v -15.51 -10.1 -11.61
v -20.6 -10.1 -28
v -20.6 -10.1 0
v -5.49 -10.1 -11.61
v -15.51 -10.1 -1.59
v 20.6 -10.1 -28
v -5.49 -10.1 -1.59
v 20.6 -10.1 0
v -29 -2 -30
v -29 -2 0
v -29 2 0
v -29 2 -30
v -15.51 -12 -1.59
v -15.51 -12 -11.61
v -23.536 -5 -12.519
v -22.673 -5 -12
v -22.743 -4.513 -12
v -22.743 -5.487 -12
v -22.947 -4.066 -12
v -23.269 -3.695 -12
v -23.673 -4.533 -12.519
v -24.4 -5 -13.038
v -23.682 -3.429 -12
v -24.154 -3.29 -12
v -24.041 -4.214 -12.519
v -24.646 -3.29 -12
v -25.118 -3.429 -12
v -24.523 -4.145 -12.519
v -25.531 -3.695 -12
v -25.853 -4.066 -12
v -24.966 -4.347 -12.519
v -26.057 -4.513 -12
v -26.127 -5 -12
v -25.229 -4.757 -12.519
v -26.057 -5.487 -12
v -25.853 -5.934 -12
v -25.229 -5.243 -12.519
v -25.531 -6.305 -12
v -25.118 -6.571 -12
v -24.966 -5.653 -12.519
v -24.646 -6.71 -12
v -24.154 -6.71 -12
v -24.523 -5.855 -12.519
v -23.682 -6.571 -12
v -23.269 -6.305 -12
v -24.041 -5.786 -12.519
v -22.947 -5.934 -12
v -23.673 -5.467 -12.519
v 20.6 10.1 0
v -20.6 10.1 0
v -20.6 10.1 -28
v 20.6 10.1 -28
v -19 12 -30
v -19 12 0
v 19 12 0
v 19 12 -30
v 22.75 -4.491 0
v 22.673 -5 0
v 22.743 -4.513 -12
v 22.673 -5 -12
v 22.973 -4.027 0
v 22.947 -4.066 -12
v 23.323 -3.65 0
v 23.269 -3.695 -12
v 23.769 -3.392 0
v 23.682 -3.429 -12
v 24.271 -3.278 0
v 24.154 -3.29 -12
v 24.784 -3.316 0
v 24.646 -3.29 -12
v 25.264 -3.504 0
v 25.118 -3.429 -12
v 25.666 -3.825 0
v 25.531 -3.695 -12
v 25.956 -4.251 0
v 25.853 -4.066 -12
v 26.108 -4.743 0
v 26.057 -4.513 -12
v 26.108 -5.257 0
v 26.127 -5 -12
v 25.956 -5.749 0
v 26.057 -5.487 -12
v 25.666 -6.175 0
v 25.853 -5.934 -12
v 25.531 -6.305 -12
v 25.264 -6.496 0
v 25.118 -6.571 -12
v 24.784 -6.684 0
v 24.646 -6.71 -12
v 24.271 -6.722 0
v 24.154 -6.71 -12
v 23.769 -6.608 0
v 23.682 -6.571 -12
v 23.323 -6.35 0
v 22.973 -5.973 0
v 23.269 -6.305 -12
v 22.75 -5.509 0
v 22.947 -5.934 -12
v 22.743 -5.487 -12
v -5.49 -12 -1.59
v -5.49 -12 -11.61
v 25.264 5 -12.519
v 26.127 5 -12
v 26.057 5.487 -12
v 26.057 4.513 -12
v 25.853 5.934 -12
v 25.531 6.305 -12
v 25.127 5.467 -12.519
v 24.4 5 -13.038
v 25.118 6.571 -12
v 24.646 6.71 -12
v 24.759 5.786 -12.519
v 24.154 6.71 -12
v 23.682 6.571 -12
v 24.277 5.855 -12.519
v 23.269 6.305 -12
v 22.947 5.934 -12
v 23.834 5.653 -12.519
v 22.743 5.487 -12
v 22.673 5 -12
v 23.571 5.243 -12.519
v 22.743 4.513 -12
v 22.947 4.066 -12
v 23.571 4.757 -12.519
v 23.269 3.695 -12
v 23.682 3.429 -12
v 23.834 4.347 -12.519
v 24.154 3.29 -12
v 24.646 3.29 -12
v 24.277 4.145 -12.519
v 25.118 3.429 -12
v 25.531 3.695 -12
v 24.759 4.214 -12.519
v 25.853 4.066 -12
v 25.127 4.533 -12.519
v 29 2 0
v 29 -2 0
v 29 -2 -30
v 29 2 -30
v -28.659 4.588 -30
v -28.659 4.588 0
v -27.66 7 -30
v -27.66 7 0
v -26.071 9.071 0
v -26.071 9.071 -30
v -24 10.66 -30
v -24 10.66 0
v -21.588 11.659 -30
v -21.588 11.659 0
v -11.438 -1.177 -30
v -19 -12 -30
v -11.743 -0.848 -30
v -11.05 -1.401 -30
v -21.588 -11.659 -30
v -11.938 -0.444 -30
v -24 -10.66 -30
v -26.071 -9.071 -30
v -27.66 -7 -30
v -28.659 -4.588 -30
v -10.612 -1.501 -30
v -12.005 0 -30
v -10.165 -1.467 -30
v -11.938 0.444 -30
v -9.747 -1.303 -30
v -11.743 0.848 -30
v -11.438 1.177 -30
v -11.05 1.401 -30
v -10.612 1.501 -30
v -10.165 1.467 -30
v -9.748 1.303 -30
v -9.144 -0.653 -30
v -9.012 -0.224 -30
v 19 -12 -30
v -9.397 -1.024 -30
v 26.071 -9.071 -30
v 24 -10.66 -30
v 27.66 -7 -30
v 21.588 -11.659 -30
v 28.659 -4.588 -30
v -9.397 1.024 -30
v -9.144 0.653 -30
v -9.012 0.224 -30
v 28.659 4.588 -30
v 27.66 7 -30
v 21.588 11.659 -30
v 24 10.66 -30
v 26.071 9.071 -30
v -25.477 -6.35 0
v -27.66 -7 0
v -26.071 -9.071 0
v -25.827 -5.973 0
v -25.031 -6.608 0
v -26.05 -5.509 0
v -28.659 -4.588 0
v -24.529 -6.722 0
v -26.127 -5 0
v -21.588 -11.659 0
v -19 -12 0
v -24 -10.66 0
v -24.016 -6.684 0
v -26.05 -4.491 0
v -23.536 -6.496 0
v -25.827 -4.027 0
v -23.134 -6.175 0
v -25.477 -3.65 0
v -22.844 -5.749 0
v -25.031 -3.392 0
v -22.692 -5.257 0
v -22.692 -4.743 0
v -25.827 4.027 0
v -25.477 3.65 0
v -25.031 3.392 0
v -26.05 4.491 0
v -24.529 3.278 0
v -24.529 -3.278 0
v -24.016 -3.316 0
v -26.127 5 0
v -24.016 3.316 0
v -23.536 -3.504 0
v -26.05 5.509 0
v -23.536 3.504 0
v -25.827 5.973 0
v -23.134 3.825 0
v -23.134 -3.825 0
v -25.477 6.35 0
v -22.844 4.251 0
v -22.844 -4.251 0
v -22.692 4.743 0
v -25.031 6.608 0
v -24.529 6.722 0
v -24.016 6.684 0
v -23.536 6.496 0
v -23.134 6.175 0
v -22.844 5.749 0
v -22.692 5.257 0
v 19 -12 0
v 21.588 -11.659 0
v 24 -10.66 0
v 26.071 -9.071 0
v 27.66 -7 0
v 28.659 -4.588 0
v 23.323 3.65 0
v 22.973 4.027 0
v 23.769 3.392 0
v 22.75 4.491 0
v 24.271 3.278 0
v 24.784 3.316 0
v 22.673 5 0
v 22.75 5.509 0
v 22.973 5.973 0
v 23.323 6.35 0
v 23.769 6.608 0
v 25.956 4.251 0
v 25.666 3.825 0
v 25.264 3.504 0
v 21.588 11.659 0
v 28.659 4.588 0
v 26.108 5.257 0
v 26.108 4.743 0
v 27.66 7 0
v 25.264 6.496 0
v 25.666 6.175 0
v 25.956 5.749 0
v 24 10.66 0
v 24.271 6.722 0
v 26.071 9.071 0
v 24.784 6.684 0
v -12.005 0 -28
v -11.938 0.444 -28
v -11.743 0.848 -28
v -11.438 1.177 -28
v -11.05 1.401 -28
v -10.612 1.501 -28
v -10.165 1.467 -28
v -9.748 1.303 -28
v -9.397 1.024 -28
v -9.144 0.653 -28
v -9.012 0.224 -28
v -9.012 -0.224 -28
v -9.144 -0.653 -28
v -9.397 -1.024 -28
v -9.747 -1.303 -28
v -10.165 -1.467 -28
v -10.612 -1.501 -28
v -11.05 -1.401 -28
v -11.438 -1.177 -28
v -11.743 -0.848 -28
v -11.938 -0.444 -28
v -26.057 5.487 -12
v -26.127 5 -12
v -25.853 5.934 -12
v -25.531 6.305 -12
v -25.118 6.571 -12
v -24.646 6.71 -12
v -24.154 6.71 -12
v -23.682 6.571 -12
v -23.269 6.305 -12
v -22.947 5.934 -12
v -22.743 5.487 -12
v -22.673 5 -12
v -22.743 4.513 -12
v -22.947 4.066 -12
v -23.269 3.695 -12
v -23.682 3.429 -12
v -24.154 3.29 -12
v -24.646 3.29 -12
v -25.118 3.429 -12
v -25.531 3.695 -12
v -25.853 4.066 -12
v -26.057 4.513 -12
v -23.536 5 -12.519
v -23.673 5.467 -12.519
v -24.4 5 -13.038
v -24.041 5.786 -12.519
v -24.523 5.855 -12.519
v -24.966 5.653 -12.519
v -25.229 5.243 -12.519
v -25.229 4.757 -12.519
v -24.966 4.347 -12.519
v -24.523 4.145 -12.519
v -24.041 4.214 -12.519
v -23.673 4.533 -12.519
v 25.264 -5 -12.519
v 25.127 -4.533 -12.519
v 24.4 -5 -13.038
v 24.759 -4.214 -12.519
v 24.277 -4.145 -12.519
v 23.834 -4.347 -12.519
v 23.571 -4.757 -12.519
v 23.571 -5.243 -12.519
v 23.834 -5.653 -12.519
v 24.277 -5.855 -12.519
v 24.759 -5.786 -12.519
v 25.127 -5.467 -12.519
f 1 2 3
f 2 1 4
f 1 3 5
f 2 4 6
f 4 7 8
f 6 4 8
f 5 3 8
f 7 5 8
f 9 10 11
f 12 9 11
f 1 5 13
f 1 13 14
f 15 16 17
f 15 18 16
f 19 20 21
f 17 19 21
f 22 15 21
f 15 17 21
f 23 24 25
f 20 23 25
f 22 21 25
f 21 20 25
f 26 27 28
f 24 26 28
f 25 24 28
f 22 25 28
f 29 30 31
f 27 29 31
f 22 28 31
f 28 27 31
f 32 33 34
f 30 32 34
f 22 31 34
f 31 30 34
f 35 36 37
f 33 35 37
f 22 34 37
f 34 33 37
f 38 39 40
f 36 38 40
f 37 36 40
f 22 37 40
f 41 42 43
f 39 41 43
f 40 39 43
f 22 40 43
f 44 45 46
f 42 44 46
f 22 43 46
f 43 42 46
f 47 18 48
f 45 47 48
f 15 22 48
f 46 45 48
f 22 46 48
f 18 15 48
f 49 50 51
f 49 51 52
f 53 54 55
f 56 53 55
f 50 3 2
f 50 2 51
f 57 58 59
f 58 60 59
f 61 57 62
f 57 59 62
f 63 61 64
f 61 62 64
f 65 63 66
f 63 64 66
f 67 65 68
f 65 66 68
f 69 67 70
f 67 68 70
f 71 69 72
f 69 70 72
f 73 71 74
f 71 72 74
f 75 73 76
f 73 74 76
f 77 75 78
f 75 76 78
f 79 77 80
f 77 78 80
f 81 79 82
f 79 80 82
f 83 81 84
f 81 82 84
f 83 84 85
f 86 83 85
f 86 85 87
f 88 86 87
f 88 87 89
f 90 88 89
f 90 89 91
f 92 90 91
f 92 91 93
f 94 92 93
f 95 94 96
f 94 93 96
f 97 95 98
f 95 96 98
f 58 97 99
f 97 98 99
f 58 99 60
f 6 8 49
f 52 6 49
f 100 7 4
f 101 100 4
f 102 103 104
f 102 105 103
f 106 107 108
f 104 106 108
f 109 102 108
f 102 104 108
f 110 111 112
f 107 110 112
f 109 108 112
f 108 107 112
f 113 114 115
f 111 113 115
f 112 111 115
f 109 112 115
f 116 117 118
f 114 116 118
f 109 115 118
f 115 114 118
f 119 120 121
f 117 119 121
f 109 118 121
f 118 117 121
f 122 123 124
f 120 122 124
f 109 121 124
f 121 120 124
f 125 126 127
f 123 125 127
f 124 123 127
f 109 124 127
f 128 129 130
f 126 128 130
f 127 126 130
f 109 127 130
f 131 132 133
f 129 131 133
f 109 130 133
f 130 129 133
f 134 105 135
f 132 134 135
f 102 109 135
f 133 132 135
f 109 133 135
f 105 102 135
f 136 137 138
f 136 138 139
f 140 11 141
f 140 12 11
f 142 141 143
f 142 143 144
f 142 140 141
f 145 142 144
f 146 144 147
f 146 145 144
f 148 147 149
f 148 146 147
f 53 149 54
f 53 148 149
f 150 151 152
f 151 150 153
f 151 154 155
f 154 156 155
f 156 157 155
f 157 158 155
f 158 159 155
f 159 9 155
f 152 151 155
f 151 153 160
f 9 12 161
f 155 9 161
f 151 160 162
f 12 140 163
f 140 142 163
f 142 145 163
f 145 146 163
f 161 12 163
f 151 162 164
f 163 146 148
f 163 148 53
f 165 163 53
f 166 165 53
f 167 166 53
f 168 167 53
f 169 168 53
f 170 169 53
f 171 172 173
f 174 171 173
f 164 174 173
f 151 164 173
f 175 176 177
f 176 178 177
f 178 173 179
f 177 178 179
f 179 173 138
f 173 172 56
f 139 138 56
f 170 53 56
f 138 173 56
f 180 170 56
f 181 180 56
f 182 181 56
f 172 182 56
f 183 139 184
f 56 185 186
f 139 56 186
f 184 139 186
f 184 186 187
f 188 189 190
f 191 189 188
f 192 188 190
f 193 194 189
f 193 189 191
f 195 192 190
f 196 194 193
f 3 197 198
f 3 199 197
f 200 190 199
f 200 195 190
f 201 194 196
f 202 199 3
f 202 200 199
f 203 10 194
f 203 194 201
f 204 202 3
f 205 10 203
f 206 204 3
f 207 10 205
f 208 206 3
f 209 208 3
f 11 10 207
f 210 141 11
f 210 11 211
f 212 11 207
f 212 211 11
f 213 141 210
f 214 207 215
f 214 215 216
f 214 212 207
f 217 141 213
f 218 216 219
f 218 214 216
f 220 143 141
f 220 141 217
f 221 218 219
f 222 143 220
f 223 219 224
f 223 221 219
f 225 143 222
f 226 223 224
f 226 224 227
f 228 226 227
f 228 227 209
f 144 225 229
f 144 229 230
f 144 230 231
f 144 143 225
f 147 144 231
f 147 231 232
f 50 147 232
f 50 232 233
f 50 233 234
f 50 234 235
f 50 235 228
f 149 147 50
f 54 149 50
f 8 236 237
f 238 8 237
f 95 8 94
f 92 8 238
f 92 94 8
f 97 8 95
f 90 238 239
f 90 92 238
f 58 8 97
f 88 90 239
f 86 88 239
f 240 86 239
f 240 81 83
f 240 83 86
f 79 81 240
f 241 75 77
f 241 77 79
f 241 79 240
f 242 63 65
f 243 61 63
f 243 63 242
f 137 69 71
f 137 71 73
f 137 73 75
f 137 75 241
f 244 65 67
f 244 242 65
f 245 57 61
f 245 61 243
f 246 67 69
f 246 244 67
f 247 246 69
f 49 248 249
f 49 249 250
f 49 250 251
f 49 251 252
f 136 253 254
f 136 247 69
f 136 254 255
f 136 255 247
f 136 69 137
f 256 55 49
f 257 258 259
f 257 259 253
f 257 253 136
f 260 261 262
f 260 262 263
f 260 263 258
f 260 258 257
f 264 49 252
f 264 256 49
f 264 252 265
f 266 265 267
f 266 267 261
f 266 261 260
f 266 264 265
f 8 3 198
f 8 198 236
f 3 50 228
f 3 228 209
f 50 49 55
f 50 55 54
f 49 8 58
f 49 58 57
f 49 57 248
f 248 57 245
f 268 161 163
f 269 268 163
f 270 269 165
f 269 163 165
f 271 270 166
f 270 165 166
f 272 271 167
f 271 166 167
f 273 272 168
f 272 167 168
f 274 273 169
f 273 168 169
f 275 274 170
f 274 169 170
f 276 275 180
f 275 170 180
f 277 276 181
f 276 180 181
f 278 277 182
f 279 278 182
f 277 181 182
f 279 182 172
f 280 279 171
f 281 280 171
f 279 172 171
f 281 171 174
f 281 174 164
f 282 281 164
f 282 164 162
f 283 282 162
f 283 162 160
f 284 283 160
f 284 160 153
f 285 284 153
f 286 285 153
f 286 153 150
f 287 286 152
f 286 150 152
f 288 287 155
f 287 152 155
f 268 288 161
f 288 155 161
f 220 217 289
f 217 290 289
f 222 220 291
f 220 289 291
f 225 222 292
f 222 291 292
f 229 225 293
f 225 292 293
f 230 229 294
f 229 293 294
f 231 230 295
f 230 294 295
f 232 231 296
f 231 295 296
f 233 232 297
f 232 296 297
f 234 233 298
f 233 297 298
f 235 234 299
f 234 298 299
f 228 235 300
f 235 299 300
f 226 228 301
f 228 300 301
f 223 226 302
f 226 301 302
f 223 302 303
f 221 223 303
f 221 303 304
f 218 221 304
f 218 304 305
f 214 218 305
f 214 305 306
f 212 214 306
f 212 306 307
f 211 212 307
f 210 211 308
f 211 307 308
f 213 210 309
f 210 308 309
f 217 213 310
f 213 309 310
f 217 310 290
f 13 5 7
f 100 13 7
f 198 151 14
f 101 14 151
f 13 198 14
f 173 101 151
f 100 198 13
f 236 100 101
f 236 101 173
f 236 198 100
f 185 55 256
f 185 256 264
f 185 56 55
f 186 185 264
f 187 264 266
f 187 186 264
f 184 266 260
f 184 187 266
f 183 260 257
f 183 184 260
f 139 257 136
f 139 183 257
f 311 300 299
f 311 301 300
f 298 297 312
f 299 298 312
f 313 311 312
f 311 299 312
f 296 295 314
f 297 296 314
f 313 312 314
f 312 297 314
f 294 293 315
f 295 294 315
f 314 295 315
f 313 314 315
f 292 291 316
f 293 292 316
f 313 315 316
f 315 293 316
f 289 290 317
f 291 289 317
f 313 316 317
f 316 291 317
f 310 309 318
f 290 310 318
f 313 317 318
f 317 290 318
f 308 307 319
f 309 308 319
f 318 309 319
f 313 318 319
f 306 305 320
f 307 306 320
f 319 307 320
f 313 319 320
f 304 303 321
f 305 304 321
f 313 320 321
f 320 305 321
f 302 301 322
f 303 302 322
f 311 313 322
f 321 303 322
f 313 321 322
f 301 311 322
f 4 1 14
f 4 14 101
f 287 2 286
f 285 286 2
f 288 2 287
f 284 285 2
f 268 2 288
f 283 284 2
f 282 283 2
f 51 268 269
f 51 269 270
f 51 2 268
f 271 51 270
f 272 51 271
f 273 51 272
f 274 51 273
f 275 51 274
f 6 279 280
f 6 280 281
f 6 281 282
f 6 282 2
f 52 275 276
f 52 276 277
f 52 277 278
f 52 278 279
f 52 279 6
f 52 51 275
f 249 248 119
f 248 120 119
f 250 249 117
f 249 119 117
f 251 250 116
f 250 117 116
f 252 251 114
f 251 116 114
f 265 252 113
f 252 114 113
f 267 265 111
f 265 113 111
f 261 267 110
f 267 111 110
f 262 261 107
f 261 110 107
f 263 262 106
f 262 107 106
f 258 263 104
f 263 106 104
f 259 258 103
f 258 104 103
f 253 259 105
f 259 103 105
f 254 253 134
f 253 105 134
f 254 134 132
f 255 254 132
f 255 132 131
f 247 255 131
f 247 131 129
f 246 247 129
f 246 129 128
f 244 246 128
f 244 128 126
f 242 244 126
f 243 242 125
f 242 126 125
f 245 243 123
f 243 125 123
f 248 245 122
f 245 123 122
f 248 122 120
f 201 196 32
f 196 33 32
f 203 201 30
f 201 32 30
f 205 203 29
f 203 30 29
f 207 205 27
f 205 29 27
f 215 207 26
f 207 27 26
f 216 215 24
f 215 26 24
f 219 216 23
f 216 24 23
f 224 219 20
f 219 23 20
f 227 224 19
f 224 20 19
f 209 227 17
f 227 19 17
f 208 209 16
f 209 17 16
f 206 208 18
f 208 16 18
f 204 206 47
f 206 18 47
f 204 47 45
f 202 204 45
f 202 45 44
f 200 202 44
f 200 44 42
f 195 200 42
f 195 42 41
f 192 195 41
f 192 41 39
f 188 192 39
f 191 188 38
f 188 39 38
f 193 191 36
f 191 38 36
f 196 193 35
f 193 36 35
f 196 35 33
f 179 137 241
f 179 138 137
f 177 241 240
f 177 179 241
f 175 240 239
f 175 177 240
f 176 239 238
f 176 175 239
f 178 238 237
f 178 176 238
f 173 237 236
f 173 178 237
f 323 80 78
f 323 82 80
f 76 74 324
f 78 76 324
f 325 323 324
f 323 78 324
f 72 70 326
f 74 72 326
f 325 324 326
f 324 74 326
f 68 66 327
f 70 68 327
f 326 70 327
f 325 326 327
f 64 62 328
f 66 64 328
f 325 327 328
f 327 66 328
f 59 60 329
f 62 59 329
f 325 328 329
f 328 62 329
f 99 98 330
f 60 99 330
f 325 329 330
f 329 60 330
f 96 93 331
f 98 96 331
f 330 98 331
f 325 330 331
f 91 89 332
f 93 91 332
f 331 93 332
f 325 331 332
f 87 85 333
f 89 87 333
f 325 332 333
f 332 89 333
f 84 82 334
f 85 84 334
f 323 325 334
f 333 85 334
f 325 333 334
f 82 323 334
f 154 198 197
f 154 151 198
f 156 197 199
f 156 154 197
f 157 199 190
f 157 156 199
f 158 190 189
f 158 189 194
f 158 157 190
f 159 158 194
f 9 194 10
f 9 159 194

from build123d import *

# Parameters (mm, degrees)
SKETCH1_W                 = 58
SKETCH1_H                 = 24
BOSS_EXTRUDE1_DEPTH       = 30
F_8_32_TAPPED_HOLE2_D     = 3.4544
F_8_32_TAPPED_HOLE2_DEPTH = 12
F_8_32_TAPPED_HOLE2_TIP   = 1.037806461
SKETCH18_W                = 41.2
SKETCH18_H                = 20.2
CUT_EXTRUDE6_DEPTH        = 28
SKETCH22_R                = 1.505
CUT_EXTRUDE9_DEPTH        = 2
SKETCH24_W                = 10.02
SKETCH24_H                = 10.02
CUT_EXTRUDE11_DEPTH       = 2
FILLET1_R                 = 10
FILLET2_R                 = 10
FILLET3_R                 = 10
FILLET4_R                 = 10


with BuildPart() as part:
    # Sketch1 → Boss-Extrude1 (new body)
    with BuildSketch(Plane.XY):
        Rectangle(SKETCH1_W, SKETCH1_H)
    extrude(amount=-BOSS_EXTRUDE1_DEPTH)

    # #8-32 Tapped Hole2
    with Locations(Plane(origin=(24.4, -5, 0), x_dir=(1, 0, 0), z_dir=(0, 0, 1))):
        with Locations((0, 0), (0, 10), (-48.8, 0), (-48.8, 10)):
            Hole(F_8_32_TAPPED_HOLE2_D / 2, depth=F_8_32_TAPPED_HOLE2_DEPTH)
            with Locations((0, 0, -(F_8_32_TAPPED_HOLE2_DEPTH + F_8_32_TAPPED_HOLE2_TIP / 2))):  # 118° drill point
                Cone(0, F_8_32_TAPPED_HOLE2_D / 2, F_8_32_TAPPED_HOLE2_TIP, mode=Mode.SUBTRACT)

    # Sketch18 → Cut-Extrude6 (cut)
    with BuildSketch(Plane.XY):
        Rectangle(SKETCH18_W, SKETCH18_H)
    extrude(amount=-CUT_EXTRUDE6_DEPTH, mode=Mode.SUBTRACT)

    # Sketch22 → Cut-Extrude9 (cut)
    with BuildSketch(Plane(origin=(0, 0, -30), x_dir=(-1, 0, 0), z_dir=(0, 0, -1))):
        with Locations((10.5, 0)):
            Circle(SKETCH22_R)
    extrude(amount=-CUT_EXTRUDE9_DEPTH, mode=Mode.SUBTRACT)

    # Sketch24 → Cut-Extrude11 (cut)
    with BuildSketch(Plane(origin=(0, -10.1, 0), x_dir=(1, 0, 0), z_dir=(0, 1, 0))):
        with Locations((-10.5, 6.6)):
            Rectangle(SKETCH24_W, SKETCH24_H)
    extrude(amount=-CUT_EXTRUDE11_DEPTH, mode=Mode.SUBTRACT)

    # Fillet1
    fillet1_edges = [part.edges().sort_by_distance(p)[0] for p in [
        (-29, 12, -15),
    ]]
    fillet(fillet1_edges, radius=FILLET1_R)

    # Fillet2
    fillet2_edges = [part.edges().sort_by_distance(p)[0] for p in [
        (29, 12, -15),
    ]]
    fillet(fillet2_edges, radius=FILLET2_R)

    # Fillet3
    fillet3_edges = [part.edges().sort_by_distance(p)[0] for p in [
        (29, -12, -15),
    ]]
    fillet(fillet3_edges, radius=FILLET3_R)

    # Fillet4
    fillet4_edges = [part.edges().sort_by_distance(p)[0] for p in [
        (-29, -12, -15),
    ]]
    fillet(fillet4_edges, radius=FILLET4_R)


solid = part.part
